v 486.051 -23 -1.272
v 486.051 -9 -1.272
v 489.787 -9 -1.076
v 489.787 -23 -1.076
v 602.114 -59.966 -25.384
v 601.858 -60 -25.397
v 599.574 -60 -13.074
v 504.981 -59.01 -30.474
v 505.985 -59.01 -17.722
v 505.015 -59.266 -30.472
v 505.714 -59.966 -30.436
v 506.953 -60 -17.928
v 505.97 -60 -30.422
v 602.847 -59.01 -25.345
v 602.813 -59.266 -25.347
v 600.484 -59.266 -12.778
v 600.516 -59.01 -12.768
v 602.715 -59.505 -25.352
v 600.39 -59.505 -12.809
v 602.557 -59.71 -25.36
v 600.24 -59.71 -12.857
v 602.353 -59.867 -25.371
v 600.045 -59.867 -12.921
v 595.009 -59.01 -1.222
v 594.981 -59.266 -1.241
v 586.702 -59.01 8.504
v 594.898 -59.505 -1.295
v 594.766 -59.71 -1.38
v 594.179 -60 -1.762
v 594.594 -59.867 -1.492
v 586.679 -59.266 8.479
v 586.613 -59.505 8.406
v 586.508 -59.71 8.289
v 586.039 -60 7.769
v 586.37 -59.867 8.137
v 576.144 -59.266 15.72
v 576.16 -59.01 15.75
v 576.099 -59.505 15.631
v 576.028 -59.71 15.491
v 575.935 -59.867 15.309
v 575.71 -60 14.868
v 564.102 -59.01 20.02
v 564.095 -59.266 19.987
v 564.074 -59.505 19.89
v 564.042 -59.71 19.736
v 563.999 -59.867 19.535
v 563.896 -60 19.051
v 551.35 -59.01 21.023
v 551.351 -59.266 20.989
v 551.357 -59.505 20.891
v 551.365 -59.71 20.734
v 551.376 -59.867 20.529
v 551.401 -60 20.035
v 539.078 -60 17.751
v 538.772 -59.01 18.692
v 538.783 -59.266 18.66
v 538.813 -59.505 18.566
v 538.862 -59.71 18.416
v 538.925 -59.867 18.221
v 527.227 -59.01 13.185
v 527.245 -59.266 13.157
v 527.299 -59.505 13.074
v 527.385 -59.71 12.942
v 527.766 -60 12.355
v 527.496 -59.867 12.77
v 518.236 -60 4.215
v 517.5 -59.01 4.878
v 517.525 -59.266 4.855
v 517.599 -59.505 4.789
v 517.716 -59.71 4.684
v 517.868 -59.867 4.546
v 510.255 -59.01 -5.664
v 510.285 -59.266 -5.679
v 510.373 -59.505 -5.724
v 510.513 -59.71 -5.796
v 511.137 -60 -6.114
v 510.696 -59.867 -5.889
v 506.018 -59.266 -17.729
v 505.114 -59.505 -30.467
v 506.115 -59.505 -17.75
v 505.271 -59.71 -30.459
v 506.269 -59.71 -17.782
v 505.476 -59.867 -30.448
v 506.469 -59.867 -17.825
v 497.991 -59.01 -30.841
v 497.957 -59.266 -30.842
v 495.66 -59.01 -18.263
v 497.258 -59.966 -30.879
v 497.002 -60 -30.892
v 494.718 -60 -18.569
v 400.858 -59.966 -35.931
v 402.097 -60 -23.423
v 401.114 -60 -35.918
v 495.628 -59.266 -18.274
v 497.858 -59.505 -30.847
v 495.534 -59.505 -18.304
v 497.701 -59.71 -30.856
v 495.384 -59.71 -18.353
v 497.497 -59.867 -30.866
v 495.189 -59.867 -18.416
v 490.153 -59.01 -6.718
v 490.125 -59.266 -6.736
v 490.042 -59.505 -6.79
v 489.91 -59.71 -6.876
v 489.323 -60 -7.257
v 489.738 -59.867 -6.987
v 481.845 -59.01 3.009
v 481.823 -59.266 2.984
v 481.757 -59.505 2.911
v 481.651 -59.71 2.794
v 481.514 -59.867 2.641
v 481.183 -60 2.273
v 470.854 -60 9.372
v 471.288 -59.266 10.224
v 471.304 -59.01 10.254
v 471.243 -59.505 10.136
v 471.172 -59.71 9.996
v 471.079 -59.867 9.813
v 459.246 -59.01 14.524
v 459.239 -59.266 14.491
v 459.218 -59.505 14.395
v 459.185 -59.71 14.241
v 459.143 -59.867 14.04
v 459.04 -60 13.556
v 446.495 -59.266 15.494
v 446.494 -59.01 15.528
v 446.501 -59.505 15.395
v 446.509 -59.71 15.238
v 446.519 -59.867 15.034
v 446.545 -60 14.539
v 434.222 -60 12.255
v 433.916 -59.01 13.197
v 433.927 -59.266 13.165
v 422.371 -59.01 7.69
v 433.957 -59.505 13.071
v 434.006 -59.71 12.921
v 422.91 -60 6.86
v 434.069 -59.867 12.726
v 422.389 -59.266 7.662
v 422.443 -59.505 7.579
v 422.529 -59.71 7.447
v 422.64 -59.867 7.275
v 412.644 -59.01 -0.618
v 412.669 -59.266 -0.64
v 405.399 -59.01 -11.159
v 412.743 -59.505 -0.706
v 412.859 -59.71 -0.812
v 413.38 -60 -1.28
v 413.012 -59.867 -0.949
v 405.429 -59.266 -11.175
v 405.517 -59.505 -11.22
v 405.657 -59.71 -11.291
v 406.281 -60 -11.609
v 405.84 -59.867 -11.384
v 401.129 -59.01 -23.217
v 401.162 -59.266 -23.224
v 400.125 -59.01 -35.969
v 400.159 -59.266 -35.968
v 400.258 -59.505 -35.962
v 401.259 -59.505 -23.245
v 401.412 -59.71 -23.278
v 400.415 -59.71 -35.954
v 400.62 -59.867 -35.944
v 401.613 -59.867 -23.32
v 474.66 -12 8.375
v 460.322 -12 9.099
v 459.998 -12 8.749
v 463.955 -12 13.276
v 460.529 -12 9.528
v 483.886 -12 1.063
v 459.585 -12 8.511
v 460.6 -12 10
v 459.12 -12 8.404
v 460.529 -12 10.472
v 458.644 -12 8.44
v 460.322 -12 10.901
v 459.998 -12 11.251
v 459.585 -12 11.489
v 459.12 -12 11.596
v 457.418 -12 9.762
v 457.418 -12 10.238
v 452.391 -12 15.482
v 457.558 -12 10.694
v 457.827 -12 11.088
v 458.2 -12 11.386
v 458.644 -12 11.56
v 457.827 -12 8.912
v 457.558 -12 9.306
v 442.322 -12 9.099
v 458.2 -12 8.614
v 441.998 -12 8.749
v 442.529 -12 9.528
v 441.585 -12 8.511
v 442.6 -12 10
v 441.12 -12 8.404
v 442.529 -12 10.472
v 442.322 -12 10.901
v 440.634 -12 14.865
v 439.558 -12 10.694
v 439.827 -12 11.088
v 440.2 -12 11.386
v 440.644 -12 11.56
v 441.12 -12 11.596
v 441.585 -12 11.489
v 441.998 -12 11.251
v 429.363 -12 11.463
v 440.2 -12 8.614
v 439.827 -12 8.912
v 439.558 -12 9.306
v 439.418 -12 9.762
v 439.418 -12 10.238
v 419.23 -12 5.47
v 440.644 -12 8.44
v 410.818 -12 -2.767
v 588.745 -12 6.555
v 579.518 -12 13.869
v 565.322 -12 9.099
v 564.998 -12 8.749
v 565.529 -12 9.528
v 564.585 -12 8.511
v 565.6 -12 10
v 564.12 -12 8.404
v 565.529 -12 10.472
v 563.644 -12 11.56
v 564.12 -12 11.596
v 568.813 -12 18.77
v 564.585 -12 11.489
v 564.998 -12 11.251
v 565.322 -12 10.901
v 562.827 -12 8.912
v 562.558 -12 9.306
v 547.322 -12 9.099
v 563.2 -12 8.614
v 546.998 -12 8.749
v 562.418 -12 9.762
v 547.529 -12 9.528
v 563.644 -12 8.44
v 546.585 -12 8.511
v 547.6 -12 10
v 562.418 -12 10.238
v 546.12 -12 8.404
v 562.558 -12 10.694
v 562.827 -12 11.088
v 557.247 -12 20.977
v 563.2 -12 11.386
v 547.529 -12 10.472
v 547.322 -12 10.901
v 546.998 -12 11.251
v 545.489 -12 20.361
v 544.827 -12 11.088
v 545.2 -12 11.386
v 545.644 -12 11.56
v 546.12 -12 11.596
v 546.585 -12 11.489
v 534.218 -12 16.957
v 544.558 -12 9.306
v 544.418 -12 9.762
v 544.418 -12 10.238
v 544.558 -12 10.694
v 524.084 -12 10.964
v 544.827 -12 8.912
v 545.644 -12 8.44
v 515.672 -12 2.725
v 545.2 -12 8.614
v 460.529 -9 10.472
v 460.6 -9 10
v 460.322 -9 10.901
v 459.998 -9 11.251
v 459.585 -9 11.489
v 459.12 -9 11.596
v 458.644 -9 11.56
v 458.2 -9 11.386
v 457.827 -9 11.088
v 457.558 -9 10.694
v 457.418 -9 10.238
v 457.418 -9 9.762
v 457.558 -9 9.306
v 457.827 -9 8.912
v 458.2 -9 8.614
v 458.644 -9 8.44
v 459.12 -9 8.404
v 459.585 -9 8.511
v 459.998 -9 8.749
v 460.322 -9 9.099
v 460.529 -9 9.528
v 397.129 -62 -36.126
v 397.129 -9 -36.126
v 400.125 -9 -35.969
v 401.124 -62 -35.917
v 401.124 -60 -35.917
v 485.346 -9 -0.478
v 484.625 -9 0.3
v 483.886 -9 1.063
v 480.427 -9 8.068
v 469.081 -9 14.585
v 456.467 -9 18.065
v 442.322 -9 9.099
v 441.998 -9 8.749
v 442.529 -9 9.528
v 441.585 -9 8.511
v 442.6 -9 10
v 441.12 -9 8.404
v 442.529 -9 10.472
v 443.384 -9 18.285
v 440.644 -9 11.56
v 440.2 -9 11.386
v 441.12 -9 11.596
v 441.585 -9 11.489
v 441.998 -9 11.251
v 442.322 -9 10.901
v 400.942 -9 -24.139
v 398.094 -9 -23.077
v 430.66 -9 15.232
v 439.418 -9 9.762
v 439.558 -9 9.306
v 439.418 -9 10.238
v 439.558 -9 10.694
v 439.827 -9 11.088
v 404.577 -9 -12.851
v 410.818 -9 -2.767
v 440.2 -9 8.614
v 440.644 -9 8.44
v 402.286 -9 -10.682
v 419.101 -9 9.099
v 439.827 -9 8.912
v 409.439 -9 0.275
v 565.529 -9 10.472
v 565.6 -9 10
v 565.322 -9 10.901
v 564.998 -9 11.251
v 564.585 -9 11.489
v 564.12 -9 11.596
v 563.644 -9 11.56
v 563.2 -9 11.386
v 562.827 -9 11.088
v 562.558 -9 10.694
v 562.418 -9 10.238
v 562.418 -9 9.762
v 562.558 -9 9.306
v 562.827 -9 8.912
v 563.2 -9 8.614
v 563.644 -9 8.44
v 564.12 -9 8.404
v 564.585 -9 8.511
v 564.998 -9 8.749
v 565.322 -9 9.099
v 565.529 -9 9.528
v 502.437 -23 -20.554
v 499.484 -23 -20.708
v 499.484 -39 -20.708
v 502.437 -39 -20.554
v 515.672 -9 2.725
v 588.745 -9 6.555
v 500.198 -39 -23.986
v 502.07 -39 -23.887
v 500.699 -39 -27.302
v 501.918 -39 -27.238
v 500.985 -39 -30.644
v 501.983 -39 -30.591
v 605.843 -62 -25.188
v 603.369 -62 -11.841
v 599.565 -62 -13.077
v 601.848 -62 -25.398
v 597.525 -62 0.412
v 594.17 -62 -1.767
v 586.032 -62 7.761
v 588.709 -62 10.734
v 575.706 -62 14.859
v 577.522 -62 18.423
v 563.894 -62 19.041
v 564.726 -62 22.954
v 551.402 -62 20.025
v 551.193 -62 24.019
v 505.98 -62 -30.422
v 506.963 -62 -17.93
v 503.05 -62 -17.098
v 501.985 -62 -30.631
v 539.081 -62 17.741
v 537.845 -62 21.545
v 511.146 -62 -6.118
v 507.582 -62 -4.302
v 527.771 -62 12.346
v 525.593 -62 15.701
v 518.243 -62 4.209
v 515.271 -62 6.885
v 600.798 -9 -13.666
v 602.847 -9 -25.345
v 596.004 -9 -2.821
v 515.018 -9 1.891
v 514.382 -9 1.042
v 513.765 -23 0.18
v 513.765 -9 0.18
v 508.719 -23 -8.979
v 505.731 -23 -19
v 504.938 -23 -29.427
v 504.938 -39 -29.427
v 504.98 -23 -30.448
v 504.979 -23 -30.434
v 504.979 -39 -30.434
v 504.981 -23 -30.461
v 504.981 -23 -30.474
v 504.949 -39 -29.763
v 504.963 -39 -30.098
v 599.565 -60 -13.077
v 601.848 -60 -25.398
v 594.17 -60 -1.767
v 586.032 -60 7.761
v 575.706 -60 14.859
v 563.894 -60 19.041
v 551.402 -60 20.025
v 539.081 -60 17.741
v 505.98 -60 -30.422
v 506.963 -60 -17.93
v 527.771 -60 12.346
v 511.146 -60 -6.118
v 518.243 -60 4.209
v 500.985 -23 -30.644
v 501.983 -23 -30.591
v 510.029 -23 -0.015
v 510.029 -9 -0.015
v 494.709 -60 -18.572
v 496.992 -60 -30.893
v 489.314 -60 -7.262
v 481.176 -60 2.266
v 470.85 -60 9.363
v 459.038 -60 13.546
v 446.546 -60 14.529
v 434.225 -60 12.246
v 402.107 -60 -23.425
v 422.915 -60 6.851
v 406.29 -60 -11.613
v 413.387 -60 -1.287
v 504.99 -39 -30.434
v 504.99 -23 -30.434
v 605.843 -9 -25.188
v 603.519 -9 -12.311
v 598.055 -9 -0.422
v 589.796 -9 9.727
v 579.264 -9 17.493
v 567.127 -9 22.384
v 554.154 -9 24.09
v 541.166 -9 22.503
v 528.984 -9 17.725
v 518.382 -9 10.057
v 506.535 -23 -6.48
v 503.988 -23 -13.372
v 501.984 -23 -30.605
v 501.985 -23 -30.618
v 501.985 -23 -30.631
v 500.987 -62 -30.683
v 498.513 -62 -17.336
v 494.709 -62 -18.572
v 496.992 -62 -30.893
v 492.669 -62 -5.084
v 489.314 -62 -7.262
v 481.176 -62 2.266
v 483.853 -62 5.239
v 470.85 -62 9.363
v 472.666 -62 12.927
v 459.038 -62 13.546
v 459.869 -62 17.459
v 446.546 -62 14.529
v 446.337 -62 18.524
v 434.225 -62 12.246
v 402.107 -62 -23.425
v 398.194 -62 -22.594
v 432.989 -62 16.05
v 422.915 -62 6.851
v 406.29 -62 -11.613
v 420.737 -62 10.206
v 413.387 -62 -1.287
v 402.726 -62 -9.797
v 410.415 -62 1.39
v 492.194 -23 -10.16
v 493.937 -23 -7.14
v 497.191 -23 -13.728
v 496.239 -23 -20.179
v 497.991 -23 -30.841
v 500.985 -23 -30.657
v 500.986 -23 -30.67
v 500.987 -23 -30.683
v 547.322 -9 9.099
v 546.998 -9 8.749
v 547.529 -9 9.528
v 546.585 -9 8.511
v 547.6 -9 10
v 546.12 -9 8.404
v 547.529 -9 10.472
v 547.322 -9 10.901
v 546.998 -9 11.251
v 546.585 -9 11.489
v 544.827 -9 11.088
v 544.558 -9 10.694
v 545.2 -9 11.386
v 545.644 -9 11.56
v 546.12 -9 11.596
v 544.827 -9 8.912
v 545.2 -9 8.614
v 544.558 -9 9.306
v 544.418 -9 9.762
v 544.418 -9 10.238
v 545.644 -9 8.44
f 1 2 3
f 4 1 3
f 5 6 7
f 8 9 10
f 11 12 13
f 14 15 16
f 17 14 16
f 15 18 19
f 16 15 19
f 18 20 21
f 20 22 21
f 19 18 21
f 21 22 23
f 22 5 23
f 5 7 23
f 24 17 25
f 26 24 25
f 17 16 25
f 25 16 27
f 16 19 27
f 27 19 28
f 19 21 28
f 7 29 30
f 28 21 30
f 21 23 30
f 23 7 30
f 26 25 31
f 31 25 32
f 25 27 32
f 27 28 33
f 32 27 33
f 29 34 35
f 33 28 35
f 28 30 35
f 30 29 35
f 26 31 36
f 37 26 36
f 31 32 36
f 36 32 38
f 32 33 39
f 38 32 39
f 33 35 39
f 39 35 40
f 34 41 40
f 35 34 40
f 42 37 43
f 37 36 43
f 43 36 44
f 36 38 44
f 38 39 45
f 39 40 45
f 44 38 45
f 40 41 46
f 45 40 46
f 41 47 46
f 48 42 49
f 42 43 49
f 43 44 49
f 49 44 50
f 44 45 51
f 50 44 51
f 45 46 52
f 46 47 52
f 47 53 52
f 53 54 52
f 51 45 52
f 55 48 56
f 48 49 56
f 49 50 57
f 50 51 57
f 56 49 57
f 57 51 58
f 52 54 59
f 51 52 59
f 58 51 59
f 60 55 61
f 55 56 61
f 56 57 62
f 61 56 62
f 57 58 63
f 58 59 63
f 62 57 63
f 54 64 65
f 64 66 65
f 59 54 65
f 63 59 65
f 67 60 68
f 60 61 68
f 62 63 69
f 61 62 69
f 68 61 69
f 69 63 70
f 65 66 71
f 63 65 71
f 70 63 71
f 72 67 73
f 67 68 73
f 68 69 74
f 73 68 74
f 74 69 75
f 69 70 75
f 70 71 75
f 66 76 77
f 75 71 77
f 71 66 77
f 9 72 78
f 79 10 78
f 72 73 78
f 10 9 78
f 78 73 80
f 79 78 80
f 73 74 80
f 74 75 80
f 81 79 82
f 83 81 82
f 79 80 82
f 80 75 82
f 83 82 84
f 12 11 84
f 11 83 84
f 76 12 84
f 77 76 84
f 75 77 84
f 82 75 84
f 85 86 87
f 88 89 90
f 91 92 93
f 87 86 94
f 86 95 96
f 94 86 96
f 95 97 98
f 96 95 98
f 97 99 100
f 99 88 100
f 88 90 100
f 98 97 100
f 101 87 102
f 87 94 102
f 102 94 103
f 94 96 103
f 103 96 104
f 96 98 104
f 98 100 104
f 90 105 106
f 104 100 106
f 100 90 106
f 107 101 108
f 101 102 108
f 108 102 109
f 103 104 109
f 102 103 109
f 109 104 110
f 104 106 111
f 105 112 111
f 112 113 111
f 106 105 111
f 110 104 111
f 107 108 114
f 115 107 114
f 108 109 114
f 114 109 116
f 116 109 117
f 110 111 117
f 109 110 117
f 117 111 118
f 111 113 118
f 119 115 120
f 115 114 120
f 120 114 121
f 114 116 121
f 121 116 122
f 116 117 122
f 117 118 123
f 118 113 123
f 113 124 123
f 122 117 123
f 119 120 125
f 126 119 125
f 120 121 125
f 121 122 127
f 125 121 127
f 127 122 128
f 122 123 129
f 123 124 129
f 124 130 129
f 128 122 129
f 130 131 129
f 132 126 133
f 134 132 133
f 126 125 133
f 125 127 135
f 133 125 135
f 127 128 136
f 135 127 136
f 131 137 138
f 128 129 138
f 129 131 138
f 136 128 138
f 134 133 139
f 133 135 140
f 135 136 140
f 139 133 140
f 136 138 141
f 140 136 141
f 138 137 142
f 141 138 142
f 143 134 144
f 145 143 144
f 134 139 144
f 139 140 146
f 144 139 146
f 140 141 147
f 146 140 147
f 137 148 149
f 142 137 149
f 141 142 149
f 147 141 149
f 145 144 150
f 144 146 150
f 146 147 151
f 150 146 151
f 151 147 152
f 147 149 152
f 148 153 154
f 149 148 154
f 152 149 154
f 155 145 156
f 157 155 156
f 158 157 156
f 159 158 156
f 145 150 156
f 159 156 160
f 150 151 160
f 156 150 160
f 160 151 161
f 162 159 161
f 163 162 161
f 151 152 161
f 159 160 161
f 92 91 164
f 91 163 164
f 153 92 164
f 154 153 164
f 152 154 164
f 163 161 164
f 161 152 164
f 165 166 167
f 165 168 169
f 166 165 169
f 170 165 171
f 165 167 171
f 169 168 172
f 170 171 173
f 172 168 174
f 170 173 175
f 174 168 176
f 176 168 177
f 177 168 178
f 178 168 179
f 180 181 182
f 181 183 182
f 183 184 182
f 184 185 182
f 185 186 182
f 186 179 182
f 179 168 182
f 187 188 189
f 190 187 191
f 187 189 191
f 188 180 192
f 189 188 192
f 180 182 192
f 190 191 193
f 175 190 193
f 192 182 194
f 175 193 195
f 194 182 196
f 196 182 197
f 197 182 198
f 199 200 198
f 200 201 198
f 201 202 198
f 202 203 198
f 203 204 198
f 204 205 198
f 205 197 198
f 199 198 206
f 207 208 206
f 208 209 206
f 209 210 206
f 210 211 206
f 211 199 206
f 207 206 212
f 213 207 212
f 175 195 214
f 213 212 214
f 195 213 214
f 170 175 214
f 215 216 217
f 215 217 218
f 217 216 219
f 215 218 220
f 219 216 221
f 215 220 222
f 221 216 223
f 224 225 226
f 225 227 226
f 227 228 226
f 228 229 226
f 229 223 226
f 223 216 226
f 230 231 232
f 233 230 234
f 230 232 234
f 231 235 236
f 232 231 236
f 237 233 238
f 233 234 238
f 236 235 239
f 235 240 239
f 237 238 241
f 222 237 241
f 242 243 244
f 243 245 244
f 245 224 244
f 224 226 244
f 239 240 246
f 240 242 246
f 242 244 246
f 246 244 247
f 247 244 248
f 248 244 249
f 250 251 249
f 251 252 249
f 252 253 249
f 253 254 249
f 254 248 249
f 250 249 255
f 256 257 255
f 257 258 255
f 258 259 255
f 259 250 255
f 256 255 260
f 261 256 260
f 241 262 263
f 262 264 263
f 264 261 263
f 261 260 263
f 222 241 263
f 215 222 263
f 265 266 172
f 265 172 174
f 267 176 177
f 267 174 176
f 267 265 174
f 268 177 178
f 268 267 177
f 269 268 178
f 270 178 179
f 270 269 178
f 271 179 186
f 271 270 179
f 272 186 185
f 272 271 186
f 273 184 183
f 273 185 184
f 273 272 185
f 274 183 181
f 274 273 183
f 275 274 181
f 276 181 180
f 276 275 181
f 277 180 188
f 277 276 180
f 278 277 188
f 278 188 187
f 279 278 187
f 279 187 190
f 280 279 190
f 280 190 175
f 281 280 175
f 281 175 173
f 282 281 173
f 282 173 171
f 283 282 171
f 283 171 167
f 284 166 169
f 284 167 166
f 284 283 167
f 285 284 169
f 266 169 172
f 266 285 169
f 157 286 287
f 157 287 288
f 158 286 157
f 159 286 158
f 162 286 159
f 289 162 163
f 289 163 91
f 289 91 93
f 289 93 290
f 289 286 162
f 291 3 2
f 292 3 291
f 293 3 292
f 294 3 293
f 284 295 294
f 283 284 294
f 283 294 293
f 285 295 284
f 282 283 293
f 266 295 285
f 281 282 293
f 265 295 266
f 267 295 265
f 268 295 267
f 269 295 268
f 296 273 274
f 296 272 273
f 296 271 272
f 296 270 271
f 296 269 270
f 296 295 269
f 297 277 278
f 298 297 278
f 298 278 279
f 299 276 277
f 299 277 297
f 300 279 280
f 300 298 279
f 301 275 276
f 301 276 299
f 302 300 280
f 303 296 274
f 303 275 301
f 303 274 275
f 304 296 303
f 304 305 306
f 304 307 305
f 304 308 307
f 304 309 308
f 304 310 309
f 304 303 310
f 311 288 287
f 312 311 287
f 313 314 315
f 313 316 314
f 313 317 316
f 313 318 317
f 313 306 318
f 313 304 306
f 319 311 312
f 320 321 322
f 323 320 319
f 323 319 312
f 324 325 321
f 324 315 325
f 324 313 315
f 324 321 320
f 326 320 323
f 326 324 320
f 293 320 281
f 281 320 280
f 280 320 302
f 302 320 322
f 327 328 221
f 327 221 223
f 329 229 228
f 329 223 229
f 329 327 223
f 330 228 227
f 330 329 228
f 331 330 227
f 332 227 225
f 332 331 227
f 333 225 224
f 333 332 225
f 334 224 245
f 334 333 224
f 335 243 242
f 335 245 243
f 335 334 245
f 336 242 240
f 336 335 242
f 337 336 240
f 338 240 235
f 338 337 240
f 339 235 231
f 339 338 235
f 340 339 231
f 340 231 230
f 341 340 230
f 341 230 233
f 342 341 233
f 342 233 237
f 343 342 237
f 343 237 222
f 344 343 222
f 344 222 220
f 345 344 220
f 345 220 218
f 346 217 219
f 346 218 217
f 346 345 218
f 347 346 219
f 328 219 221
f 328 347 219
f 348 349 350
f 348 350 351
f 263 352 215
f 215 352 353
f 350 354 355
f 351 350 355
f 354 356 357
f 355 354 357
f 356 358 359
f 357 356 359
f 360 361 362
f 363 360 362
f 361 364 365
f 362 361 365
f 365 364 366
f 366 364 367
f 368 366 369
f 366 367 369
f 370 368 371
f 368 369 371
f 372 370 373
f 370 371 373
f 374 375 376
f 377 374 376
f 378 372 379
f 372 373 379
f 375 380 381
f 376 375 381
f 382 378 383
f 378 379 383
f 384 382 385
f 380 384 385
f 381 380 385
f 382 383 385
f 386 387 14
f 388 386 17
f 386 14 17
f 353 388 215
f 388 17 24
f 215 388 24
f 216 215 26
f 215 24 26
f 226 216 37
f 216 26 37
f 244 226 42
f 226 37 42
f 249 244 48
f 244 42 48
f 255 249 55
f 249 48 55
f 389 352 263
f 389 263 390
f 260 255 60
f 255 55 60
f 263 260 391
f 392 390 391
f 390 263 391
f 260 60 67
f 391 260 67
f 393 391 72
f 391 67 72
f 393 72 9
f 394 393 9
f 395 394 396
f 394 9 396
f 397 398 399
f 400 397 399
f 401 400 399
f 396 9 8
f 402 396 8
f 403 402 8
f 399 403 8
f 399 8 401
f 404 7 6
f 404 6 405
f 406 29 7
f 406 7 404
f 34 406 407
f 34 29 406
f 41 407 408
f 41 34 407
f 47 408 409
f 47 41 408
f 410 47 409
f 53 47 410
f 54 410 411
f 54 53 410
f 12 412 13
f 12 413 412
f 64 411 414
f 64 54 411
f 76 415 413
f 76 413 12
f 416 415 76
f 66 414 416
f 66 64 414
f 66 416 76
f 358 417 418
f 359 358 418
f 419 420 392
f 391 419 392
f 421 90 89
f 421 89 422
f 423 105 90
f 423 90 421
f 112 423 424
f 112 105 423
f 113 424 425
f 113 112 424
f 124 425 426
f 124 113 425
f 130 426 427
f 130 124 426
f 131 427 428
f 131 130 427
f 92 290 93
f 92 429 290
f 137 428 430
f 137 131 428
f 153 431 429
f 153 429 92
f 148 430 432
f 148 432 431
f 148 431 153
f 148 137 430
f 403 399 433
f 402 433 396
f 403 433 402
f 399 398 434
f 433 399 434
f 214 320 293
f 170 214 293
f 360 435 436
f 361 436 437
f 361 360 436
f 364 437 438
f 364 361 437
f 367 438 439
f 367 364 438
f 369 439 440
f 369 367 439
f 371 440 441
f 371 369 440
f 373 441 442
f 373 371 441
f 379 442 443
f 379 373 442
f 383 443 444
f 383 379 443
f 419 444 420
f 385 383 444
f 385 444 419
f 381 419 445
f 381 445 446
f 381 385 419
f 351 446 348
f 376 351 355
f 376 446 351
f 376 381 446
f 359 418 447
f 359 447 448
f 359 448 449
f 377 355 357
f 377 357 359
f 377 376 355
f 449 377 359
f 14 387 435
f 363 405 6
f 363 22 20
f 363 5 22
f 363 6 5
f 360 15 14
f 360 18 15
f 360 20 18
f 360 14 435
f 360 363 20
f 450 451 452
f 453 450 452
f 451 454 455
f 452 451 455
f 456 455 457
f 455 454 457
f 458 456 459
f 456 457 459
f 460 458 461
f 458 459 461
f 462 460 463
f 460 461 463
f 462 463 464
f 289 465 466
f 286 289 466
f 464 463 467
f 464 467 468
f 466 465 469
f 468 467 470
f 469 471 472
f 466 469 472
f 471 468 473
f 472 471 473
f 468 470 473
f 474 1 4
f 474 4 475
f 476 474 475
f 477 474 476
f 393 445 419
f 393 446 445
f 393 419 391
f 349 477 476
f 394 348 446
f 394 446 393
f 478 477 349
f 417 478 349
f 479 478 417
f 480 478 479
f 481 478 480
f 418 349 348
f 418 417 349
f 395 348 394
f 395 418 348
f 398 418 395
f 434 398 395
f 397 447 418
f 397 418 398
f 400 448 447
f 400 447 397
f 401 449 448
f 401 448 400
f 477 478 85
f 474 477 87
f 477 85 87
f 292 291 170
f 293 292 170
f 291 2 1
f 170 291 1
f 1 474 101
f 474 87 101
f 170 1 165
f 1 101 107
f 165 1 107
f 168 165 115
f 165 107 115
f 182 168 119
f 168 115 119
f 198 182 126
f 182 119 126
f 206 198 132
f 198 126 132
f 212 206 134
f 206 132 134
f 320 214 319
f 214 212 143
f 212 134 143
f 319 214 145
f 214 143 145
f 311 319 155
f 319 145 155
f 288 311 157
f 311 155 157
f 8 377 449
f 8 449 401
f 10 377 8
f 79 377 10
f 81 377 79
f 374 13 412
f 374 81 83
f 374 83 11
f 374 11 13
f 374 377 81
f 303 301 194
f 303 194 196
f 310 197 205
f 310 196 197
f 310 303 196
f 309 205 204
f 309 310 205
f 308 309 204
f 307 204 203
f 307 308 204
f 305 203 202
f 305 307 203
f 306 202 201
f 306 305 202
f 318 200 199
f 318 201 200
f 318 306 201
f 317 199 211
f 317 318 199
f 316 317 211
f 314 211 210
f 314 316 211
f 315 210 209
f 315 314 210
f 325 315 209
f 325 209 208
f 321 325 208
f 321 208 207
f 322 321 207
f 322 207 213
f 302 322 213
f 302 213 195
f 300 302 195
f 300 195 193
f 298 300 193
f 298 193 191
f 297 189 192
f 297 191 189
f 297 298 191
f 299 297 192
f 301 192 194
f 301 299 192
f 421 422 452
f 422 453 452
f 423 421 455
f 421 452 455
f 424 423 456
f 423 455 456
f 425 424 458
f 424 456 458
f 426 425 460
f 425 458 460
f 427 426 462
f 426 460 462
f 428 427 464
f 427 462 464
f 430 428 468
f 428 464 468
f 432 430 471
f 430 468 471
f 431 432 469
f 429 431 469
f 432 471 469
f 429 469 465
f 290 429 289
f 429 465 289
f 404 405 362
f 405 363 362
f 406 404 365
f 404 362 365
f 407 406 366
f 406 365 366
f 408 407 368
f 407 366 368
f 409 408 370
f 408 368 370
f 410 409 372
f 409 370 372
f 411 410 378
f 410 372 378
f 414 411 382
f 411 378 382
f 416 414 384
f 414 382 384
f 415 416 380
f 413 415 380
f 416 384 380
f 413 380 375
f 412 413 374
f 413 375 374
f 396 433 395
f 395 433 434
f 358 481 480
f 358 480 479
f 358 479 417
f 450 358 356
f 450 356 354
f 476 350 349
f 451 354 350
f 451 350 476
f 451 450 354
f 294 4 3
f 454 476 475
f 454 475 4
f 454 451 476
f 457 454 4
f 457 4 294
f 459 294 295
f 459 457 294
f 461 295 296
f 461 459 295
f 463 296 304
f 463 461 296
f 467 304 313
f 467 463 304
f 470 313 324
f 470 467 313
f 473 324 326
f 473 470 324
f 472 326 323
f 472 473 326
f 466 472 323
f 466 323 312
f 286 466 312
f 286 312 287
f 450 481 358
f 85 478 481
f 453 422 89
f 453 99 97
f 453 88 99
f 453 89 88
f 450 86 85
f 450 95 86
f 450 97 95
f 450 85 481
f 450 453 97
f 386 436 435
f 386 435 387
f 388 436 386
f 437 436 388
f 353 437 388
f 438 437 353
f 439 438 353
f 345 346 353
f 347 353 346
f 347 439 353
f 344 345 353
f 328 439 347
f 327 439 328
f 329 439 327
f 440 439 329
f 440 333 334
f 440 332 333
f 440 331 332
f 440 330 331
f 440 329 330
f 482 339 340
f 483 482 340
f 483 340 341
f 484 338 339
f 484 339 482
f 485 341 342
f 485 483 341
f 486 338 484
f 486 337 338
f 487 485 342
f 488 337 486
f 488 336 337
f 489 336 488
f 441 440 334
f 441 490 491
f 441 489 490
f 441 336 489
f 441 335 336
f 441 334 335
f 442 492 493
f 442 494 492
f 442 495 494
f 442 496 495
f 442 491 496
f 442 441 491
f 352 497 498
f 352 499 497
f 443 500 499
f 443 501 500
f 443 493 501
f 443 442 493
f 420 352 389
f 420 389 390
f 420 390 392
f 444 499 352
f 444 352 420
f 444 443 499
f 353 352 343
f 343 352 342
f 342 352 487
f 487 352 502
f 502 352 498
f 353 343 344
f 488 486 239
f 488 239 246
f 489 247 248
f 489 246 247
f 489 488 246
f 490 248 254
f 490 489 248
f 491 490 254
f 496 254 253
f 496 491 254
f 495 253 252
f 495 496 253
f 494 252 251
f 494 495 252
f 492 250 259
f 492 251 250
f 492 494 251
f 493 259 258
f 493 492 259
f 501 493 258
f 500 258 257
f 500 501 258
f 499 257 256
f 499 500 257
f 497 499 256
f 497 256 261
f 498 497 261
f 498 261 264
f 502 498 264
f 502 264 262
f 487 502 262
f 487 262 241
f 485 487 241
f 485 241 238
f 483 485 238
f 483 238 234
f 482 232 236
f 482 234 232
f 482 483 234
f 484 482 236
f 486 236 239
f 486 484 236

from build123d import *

# Parameters (mm, degrees)
CYLINDER158_R             = 1.6
CYLINDER158_DEPTH         = 9
CYLINDER159_R             = 1.6
CYLINDER159_DEPTH         = 9
CYLINDER156_R             = 1.6
CYLINDER156_DEPTH         = 9
CYLINDER157_R             = 1.6
CYLINDER157_DEPTH         = 9
BOX068_W                  = 59
BOX068_H                  = 20
BOX068_DEPTH              = 32
BOX068_PLACEMENT_ANGLE    = 3
BOX066_W                  = 128
BOX066_H                  = 3
BOX066_DEPTH              = 35
BOX066_PLACEMENT_ANGLE    = 3
CYLINDER147_W             = 52
CYLINDER147_H             = 3
CYLINDER147_ANGLE         = 180
CYLINDER147_ROLL_ANGLE    = 90
CYLINDER147_PITCH_ANGLE   = -3
BOX067_W                  = 128
BOX067_H                  = 3
BOX067_DEPTH              = 35
BOX067_PLACEMENT_ANGLE    = 3
CYLINDER148_W             = 52
CYLINDER148_H             = 3
CYLINDER148_ANGLE         = 180
CYLINDER148_ROLL_ANGLE    = 90
CYLINDER148_PITCH_ANGLE   = -3
BOX065_W                  = 7
BOX065_H                  = 30
BOX065_DEPTH              = 10
BOX065_PLACEMENT_ANGLE    = 3
CYLINDER144_W             = 49
CYLINDER144_H             = 53
CYLINDER144_ANGLE         = 180
CYLINDER143_W             = 52
CYLINDER143_H             = 53
CYLINDER143_ANGLE         = 180
CYLINDER146_W             = 48
CYLINDER146_H             = 2
CYLINDER146_ANGLE         = 180
CYLINDER145_W             = 52
CYLINDER145_H             = 2
CYLINDER145_ANGLE         = 180
FUSION121_PLACEMENT_ANGLE = 3
FILLET033_R               = 0.99


with BuildPart() as cylinder158:
    # Cylinder158 → Cylinder158 (new body)
    with BuildSketch(Plane(origin=(555, -5, 10), x_dir=(1, 0, 0), z_dir=(0, -1, 0))):
        Circle(CYLINDER158_R)
    extrude(amount=CYLINDER158_DEPTH)


with BuildPart() as fusion134:
    # Cylinder159 → Cylinder159 (new body)
    with BuildSketch(Plane(origin=(450, -5, 10), x_dir=(1, 0, 0), z_dir=(0, -1, 0))):
        Circle(CYLINDER159_R)
    extrude(amount=CYLINDER159_DEPTH)

    # Fusion134: union Cylinder158
    add(cylinder158.part)


with BuildPart() as fusion134_1:
    # Fusion134 placement: moved
    add(fusion134.part.moved(Location((9, 0, 0))))


with BuildPart() as cylinder156:
    # Cylinder156 → Cylinder156 (new body)
    with BuildSketch(Plane(origin=(555, -5, 10), x_dir=(1, 0, 0), z_dir=(0, -1, 0))):
        Circle(CYLINDER156_R)
    extrude(amount=CYLINDER156_DEPTH)


with BuildPart() as fusion136:
    # Cylinder157 → Cylinder157 (new body)
    with BuildSketch(Plane(origin=(450, -5, 10), x_dir=(1, 0, 0), z_dir=(0, -1, 0))):
        Circle(CYLINDER157_R)
    extrude(amount=CYLINDER157_DEPTH)

    # Fusion133: union Cylinder156
    add(cylinder156.part)


with BuildPart() as fusion136_1:
    # Fusion133 placement: moved
    add(fusion136.part.moved(Location((-9, 0, 0))))

    # Fusion136: union Fusion134
    add(fusion134_1.part)


with BuildPart() as cube047:
    # Box068 → Box068 (new body)
    with BuildSketch(Plane.XY):
        with Locations((29.5, 10)):
            Rectangle(BOX068_W, BOX068_H)
    extrude(amount=BOX068_DEPTH)


with BuildPart() as cube047_1:
    # Box068 placement: moved
    add(cube047.part.moved(Location((473, -20, -36))).rotate(Axis((473, -20, -36), (0, -1, 0)), BOX068_PLACEMENT_ANGLE))


with BuildPart() as cube045:
    # Box066 → Box066 (new body)
    with BuildSketch(Plane.XY):
        with Locations((64, 1.5)):
            Rectangle(BOX066_W, BOX066_H)
    extrude(amount=BOX066_DEPTH)


with BuildPart() as cube045_1:
    # Box066 placement: moved
    add(cube045.part.moved(Location((382, -9, -40.8))).rotate(Axis((382, -9, -40.8), (0, -1, 0)), BOX066_PLACEMENT_ANGLE))


with BuildPart() as cut079:
    # Cylinder147 → Cylinder147 (revolve)
    with BuildSketch(Plane.XZ):
        with Locations((26, 1.5)):
            Rectangle(CYLINDER147_W, CYLINDER147_H)
    revolve(axis=Axis((0, 0, 0), (0, 0, 1)), revolution_arc=CYLINDER147_ANGLE)


with BuildPart() as cut079_1:
    # Cylinder147 roll: moved
    add(cut079.part.rotate(Axis((0, 0, 0), (1, 0, 0)), CYLINDER147_ROLL_ANGLE))


with BuildPart() as cut079_2:
    # Cylinder147 pitch: moved
    add(cut079_1.part.rotate(Axis((0, 0, 0), (0, 1, 0)), CYLINDER147_PITCH_ANGLE))


with BuildPart() as cut079_3:
    # Cylinder147 placement: moved
    add(cut079_2.part.moved(Location((448.581401, -6, -35.39126))))

    # Cut079: cut Cube045
    add(cube045_1.part, mode=Mode.SUBTRACT)


with BuildPart() as cut079_4:
    # Cut079 placement: moved
    add(cut079_3.part.moved(Location((0.48, 0, -0.5))))


with BuildPart() as cube046:
    # Box067 → Box067 (new body)
    with BuildSketch(Plane.XY):
        with Locations((64, 1.5)):
            Rectangle(BOX067_W, BOX067_H)
    extrude(amount=BOX067_DEPTH)


with BuildPart() as cube046_1:
    # Box067 placement: moved
    add(cube046.part.moved(Location((382, -9, -40.8))).rotate(Axis((382, -9, -40.8), (0, -1, 0)), BOX067_PLACEMENT_ANGLE))


with BuildPart() as cut080:
    # Cylinder148 → Cylinder148 (revolve)
    with BuildSketch(Plane.XZ):
        with Locations((26, 1.5)):
            Rectangle(CYLINDER148_W, CYLINDER148_H)
    revolve(axis=Axis((0, 0, 0), (0, 0, 1)), revolution_arc=CYLINDER148_ANGLE)


with BuildPart() as cut080_1:
    # Cylinder148 roll: moved
    add(cut080.part.rotate(Axis((0, 0, 0), (1, 0, 0)), CYLINDER148_ROLL_ANGLE))


with BuildPart() as cut080_2:
    # Cylinder148 pitch: moved
    add(cut080_1.part.rotate(Axis((0, 0, 0), (0, 1, 0)), CYLINDER148_PITCH_ANGLE))


with BuildPart() as cut080_3:
    # Cylinder148 placement: moved
    add(cut080_2.part.moved(Location((448.581401, -6, -35.39126))))

    # Cut080: cut Cube046
    add(cube046_1.part, mode=Mode.SUBTRACT)


with BuildPart() as cut080_4:
    # Cut080 placement: moved
    add(cut080_3.part.moved(Location((105.48, 0, 5))))


with BuildPart() as cube044:
    # Box065 → Box065 (new body)
    with BuildSketch(Plane.XY):
        with Locations((3.5, 15)):
            Rectangle(BOX065_W, BOX065_H)
    extrude(amount=BOX065_DEPTH)


with BuildPart() as cube044_1:
    # Box065 placement: moved
    add(cube044.part.moved(Location((498, -39, -32.8))).rotate(Axis((498, -39, -32.8), (0, -1, 0)), BOX065_PLACEMENT_ANGLE))


with BuildPart() as cylinder144:
    # Cylinder144 → Cylinder144 (revolve)
    with BuildSketch(Plane(origin=(450, -9, -42), x_dir=(1, 0, 0), z_dir=(0, 0, -1))):
        with Locations((24.5, 26.5)):
            Rectangle(CYLINDER144_W, CYLINDER144_H)
    revolve(axis=Axis((450, -9, -42), (0, -1, 0)), revolution_arc=CYLINDER144_ANGLE)


with BuildPart() as cylinder143:
    # Cylinder143 → Cylinder143 (revolve)
    with BuildSketch(Plane(origin=(450, -9, -42), x_dir=(1, 0, 0), z_dir=(0, 0, -1))):
        with Locations((26, 26.5)):
            Rectangle(CYLINDER143_W, CYLINDER143_H)
    revolve(axis=Axis((450, -9, -42), (0, -1, 0)), revolution_arc=CYLINDER143_ANGLE)


with BuildPart() as cut077:
    # Cut077 base: copy of Cylinder143
    add(cylinder143.part)

    # Cut077: cut Cylinder144
    add(cylinder144.part, mode=Mode.SUBTRACT)


with BuildPart() as cut077_1:
    # Cut077 placement: moved
    add(cut077.part.moved(Location((0, 0, 10))))


with BuildPart() as cylinder146:
    # Cylinder146 → Cylinder146 (revolve)
    with BuildSketch(Plane(origin=(450, -12, -42), x_dir=(1, 0, 0), z_dir=(0, 0, -1))):
        with Locations((24, 1)):
            Rectangle(CYLINDER146_W, CYLINDER146_H)
    revolve(axis=Axis((450, -12, -42), (0, -1, 0)), revolution_arc=CYLINDER146_ANGLE)


with BuildPart() as cylinder145:
    # Cylinder145 → Cylinder145 (revolve)
    with BuildSketch(Plane(origin=(450, -12, -42), x_dir=(1, 0, 0), z_dir=(0, 0, -1))):
        with Locations((26, 1)):
            Rectangle(CYLINDER145_W, CYLINDER145_H)
    revolve(axis=Axis((450, -12, -42), (0, -1, 0)), revolution_arc=CYLINDER145_ANGLE)


with BuildPart() as fusion120:
    # Cut078 base: copy of Cylinder145
    add(cylinder145.part)

    # Cut078: cut Cylinder146
    add(cylinder146.part, mode=Mode.SUBTRACT)


with BuildPart() as fusion120_1:
    # Cut078 placement: moved
    add(fusion120.part.moved(Location((0, -48, 10))))

    # Fusion120: union Cut077
    add(cut077_1.part)


with BuildPart() as cut075:
    # Cut075 base: copy of Cylinder143
    add(cylinder143.part)

    # Cut075: cut Cylinder144
    add(cylinder144.part, mode=Mode.SUBTRACT)


with BuildPart() as cut075_1:
    # Cut075 placement: moved
    add(cut075.part.moved(Location((0, 0, 10))))


with BuildPart() as fender_lh:
    # Cut076 base: copy of Cylinder145
    add(cylinder145.part)

    # Cut076: cut Cylinder146
    add(cylinder146.part, mode=Mode.SUBTRACT)


with BuildPart() as fender_lh_1:
    # Cut076 placement: moved
    add(fender_lh.part.moved(Location((0, -48, 10))))

    # Fusion119: union Cut075
    add(cut075_1.part)


with BuildPart() as fender_lh_2:
    # Fusion119 placement: moved
    add(fender_lh_1.part.moved(Location((105, 0, 0))))

    # Fusion121: union Fusion120
    add(fusion120_1.part)


with BuildPart() as fender_lh_3:
    # Fusion121 placement: moved
    add(fender_lh_2.part.moved(Location((-2, 0, -27))).rotate(Axis((-2, 0, -27), (0, -1, 0)), FUSION121_PLACEMENT_ANGLE))

    # Fusion122: union Cube044
    add(cube044_1.part)


with BuildPart() as fender_lh_4:
    # Fusion122 placement: moved
    add(fender_lh_3.part.moved(Location((0, 3, 0))))

    # Fusion123: union Cut079, Cut080
    add(cut079_4.part)
    add(cut080_4.part)

    # Cut081: cut Cube047
    add(cube047_1.part, mode=Mode.SUBTRACT)

    # Fillet033
    fillet033_edges = [fender_lh_4.edges().sort_by_distance(p)[0] for p in [
        (551.349681, -57, 19.023158),
        (446.493579, -57, 13.527882),
    ]]
    fillet(fillet033_edges, radius=FILLET033_R)


with BuildPart() as fender_lh_5:
    # Fillet033 placement: moved
    add(fender_lh_4.part.moved(Location((0, -3, 2))))

    # Cut084: cut Fusion136
    add(fusion136_1.part, mode=Mode.SUBTRACT)


solid = fender_lh_5.part
